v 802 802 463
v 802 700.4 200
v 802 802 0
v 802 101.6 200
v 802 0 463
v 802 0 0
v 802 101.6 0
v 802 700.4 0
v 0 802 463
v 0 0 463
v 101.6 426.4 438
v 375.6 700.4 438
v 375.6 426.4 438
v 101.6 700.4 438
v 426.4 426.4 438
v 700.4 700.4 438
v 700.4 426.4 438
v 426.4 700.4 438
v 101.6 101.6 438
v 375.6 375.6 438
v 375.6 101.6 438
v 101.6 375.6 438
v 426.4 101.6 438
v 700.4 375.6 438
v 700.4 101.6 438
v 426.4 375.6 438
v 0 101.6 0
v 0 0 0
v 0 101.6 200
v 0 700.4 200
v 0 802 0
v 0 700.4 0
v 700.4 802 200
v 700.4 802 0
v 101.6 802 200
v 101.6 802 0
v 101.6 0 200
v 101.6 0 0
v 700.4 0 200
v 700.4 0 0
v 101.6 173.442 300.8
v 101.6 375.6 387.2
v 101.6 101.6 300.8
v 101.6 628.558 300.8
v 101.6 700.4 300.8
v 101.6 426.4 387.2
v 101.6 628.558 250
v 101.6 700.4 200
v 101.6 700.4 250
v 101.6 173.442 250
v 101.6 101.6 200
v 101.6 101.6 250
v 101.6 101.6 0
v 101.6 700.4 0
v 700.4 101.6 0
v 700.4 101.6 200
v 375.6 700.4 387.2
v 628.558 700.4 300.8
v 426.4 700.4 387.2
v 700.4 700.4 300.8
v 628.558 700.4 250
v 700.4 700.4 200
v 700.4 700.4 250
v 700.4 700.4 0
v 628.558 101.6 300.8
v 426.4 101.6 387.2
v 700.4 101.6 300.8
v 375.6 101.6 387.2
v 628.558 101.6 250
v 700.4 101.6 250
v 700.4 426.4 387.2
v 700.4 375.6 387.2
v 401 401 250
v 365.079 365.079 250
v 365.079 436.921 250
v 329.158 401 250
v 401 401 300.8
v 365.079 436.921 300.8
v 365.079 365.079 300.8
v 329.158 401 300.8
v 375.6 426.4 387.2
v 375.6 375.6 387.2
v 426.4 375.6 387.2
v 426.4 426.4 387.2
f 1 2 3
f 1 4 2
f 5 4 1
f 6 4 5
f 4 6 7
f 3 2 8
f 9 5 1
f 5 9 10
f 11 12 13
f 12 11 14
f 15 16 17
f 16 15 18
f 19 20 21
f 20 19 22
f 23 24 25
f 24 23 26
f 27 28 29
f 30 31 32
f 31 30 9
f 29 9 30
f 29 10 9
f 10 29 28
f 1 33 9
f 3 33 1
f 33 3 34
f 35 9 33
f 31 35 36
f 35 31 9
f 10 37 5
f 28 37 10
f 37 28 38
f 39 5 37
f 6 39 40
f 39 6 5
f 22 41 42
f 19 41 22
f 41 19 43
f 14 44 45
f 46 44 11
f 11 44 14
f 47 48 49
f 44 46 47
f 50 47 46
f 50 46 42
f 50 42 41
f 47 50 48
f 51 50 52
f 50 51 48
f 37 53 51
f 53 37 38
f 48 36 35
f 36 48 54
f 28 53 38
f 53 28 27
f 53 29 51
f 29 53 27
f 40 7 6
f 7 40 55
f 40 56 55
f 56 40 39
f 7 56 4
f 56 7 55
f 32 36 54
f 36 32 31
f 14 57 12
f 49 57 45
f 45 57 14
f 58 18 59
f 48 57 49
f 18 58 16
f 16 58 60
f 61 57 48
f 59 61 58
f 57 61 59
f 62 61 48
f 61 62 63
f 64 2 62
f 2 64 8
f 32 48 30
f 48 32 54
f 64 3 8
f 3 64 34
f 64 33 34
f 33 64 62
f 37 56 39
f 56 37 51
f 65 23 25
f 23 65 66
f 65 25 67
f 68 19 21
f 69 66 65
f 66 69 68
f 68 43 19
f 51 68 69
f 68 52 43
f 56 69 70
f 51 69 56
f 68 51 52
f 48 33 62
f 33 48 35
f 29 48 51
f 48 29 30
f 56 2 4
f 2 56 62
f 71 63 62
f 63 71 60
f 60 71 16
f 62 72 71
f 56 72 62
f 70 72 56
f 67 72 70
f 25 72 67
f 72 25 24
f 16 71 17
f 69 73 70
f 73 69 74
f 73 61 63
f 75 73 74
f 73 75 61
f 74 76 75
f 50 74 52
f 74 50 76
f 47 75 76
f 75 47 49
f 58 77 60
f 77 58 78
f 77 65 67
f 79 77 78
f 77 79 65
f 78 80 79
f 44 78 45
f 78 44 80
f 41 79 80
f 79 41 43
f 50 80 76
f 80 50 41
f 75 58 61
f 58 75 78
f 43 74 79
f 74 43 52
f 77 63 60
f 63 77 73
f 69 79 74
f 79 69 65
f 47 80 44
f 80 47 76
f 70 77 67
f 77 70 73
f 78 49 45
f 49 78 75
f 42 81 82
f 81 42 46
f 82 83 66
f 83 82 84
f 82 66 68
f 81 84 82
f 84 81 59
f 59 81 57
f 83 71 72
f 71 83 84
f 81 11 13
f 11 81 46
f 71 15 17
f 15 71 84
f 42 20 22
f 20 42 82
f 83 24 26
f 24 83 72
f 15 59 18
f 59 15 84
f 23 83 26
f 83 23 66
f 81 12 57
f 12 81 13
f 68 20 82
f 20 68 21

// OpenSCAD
// OpenSCAD Table for Sovol SV08 Max 3D Printer
// Table dimensions: 802mm x 802mm x 463mm (desk height)
// Designed with 2-inch clearance on all sides
// Features 4x4 inch corner posts and cross rails

// Convert inches to mm
inch = 25.4;

// Table dimensions
table_width = 802;  // mm
table_depth = 802;  // mm
table_height = 463; // mm (desk height - printer bed at ~30" from floor)

// Post and rail dimensions
post_size = 4 * inch;  // 4x4 inch posts (101.6mm)
rail_size = 4 * inch;  // 4x4 inch rails (101.6mm)

// Table top thickness
top_thickness = 25; // mm

module corner_post() {
    cube([post_size, post_size, table_height - top_thickness]);
}

module cross_rail_x() {
    cube([table_width - 2 * post_size, rail_size, rail_size]);
}

module cross_rail_y() {
    cube([rail_size, table_depth - 2 * post_size, rail_size]);
}

module table_top() {
    cube([table_width, table_depth, top_thickness]);
}

module sv08_max_table() {
    // Table top
    translate([0, 0, table_height - top_thickness])
        table_top();

    // Corner posts
    // Front left
    translate([0, 0, 0])
        corner_post();

    // Front right
    translate([table_width - post_size, 0, 0])
        corner_post();

    // Back left
    translate([0, table_depth - post_size, 0])
        corner_post();

    // Back right
    translate([table_width - post_size, table_depth - post_size, 0])
        corner_post();

    // Cross rails - bottom level (200mm from ground)
    rail_height = 200;

    // Front and back rails (X direction)
    translate([post_size, 0, rail_height])
        cross_rail_x();
    translate([post_size, table_depth - rail_size, rail_height])
        cross_rail_x();

    // Left and right rails (Y direction)
    translate([0, post_size, rail_height])
        cross_rail_y();
    translate([table_width - rail_size, post_size, rail_height])
        cross_rail_y();

    // Mid-level cross rails for additional support
    mid_rail_height = 250;

    // Front and back mid rails
    translate([post_size, 0, mid_rail_height])
        cross_rail_x();
    translate([post_size, table_depth - rail_size, mid_rail_height])
        cross_rail_x();

    // Left and right mid rails
    translate([0, post_size, mid_rail_height])
        cross_rail_y();
    translate([table_width - rail_size, post_size, mid_rail_height])
        cross_rail_y();

    // Top support rails (just below table top)
    top_rail_height = table_height - top_thickness - rail_size;

    // Front and back top rails
    translate([post_size, 0, top_rail_height])
        cross_rail_x();
    translate([post_size, table_depth - rail_size, top_rail_height])
        cross_rail_x();

    // Left and right top rails
    translate([0, post_size, top_rail_height])
        cross_rail_y();
    translate([table_width - rail_size, post_size, top_rail_height])
        cross_rail_y();

    // Diagonal cross members for additional stability at mid-level
    // These provide X-bracing between corner posts
    inner_width = table_width - 2 * post_size;
    inner_depth = table_depth - 2 * post_size;
    diagonal_length = sqrt(pow(inner_width, 2) + pow(inner_depth, 2));
    diagonal_angle = atan2(inner_depth, inner_width);

    // Diagonal brace 1: front-left to back-right
    translate([post_size, post_size, mid_rail_height])
        rotate([0, 0, diagonal_angle])
        cube([diagonal_length, rail_size/2, rail_size/2]);

    // Diagonal brace 2: front-right to back-left
    translate([table_width - post_size, post_size, mid_rail_height])
        rotate([0, 0, 180 - diagonal_angle])
        cube([diagonal_length, rail_size/2, rail_size/2]);

    // Center support beam running lengthwise to support table top
    center_beam_height = top_rail_height + rail_size/2;
    translate([post_size, table_depth/2 - rail_size/4, center_beam_height])
        cube([inner_width, rail_size/2, rail_size/2]);

    // Center support beam running widthwise to support table top
    translate([table_width/2 - rail_size/4, post_size, center_beam_height])
        cube([rail_size/2, inner_depth, rail_size/2]);
}

// Display information
echo("=== SV08 Max Table Specifications ===");
echo(str("Table dimensions: ", table_width, "mm x ", table_depth, "mm x ", table_height, "mm"));
echo(str("Post size: ", post_size, "mm x ", post_size, "mm (", post_size/inch, "\" x ", post_size/inch, "\")"));
echo(str("Rail size: ", rail_size, "mm x ", rail_size, "mm (", rail_size/inch, "\" x ", rail_size/inch, "\")"));
echo(str("Estimated SV08 Max footprint: 700mm x 700mm x 800mm"));
echo(str("Clearance provided: 51mm (2\") on all sides"));

// Render the table
sv08_max_table();
